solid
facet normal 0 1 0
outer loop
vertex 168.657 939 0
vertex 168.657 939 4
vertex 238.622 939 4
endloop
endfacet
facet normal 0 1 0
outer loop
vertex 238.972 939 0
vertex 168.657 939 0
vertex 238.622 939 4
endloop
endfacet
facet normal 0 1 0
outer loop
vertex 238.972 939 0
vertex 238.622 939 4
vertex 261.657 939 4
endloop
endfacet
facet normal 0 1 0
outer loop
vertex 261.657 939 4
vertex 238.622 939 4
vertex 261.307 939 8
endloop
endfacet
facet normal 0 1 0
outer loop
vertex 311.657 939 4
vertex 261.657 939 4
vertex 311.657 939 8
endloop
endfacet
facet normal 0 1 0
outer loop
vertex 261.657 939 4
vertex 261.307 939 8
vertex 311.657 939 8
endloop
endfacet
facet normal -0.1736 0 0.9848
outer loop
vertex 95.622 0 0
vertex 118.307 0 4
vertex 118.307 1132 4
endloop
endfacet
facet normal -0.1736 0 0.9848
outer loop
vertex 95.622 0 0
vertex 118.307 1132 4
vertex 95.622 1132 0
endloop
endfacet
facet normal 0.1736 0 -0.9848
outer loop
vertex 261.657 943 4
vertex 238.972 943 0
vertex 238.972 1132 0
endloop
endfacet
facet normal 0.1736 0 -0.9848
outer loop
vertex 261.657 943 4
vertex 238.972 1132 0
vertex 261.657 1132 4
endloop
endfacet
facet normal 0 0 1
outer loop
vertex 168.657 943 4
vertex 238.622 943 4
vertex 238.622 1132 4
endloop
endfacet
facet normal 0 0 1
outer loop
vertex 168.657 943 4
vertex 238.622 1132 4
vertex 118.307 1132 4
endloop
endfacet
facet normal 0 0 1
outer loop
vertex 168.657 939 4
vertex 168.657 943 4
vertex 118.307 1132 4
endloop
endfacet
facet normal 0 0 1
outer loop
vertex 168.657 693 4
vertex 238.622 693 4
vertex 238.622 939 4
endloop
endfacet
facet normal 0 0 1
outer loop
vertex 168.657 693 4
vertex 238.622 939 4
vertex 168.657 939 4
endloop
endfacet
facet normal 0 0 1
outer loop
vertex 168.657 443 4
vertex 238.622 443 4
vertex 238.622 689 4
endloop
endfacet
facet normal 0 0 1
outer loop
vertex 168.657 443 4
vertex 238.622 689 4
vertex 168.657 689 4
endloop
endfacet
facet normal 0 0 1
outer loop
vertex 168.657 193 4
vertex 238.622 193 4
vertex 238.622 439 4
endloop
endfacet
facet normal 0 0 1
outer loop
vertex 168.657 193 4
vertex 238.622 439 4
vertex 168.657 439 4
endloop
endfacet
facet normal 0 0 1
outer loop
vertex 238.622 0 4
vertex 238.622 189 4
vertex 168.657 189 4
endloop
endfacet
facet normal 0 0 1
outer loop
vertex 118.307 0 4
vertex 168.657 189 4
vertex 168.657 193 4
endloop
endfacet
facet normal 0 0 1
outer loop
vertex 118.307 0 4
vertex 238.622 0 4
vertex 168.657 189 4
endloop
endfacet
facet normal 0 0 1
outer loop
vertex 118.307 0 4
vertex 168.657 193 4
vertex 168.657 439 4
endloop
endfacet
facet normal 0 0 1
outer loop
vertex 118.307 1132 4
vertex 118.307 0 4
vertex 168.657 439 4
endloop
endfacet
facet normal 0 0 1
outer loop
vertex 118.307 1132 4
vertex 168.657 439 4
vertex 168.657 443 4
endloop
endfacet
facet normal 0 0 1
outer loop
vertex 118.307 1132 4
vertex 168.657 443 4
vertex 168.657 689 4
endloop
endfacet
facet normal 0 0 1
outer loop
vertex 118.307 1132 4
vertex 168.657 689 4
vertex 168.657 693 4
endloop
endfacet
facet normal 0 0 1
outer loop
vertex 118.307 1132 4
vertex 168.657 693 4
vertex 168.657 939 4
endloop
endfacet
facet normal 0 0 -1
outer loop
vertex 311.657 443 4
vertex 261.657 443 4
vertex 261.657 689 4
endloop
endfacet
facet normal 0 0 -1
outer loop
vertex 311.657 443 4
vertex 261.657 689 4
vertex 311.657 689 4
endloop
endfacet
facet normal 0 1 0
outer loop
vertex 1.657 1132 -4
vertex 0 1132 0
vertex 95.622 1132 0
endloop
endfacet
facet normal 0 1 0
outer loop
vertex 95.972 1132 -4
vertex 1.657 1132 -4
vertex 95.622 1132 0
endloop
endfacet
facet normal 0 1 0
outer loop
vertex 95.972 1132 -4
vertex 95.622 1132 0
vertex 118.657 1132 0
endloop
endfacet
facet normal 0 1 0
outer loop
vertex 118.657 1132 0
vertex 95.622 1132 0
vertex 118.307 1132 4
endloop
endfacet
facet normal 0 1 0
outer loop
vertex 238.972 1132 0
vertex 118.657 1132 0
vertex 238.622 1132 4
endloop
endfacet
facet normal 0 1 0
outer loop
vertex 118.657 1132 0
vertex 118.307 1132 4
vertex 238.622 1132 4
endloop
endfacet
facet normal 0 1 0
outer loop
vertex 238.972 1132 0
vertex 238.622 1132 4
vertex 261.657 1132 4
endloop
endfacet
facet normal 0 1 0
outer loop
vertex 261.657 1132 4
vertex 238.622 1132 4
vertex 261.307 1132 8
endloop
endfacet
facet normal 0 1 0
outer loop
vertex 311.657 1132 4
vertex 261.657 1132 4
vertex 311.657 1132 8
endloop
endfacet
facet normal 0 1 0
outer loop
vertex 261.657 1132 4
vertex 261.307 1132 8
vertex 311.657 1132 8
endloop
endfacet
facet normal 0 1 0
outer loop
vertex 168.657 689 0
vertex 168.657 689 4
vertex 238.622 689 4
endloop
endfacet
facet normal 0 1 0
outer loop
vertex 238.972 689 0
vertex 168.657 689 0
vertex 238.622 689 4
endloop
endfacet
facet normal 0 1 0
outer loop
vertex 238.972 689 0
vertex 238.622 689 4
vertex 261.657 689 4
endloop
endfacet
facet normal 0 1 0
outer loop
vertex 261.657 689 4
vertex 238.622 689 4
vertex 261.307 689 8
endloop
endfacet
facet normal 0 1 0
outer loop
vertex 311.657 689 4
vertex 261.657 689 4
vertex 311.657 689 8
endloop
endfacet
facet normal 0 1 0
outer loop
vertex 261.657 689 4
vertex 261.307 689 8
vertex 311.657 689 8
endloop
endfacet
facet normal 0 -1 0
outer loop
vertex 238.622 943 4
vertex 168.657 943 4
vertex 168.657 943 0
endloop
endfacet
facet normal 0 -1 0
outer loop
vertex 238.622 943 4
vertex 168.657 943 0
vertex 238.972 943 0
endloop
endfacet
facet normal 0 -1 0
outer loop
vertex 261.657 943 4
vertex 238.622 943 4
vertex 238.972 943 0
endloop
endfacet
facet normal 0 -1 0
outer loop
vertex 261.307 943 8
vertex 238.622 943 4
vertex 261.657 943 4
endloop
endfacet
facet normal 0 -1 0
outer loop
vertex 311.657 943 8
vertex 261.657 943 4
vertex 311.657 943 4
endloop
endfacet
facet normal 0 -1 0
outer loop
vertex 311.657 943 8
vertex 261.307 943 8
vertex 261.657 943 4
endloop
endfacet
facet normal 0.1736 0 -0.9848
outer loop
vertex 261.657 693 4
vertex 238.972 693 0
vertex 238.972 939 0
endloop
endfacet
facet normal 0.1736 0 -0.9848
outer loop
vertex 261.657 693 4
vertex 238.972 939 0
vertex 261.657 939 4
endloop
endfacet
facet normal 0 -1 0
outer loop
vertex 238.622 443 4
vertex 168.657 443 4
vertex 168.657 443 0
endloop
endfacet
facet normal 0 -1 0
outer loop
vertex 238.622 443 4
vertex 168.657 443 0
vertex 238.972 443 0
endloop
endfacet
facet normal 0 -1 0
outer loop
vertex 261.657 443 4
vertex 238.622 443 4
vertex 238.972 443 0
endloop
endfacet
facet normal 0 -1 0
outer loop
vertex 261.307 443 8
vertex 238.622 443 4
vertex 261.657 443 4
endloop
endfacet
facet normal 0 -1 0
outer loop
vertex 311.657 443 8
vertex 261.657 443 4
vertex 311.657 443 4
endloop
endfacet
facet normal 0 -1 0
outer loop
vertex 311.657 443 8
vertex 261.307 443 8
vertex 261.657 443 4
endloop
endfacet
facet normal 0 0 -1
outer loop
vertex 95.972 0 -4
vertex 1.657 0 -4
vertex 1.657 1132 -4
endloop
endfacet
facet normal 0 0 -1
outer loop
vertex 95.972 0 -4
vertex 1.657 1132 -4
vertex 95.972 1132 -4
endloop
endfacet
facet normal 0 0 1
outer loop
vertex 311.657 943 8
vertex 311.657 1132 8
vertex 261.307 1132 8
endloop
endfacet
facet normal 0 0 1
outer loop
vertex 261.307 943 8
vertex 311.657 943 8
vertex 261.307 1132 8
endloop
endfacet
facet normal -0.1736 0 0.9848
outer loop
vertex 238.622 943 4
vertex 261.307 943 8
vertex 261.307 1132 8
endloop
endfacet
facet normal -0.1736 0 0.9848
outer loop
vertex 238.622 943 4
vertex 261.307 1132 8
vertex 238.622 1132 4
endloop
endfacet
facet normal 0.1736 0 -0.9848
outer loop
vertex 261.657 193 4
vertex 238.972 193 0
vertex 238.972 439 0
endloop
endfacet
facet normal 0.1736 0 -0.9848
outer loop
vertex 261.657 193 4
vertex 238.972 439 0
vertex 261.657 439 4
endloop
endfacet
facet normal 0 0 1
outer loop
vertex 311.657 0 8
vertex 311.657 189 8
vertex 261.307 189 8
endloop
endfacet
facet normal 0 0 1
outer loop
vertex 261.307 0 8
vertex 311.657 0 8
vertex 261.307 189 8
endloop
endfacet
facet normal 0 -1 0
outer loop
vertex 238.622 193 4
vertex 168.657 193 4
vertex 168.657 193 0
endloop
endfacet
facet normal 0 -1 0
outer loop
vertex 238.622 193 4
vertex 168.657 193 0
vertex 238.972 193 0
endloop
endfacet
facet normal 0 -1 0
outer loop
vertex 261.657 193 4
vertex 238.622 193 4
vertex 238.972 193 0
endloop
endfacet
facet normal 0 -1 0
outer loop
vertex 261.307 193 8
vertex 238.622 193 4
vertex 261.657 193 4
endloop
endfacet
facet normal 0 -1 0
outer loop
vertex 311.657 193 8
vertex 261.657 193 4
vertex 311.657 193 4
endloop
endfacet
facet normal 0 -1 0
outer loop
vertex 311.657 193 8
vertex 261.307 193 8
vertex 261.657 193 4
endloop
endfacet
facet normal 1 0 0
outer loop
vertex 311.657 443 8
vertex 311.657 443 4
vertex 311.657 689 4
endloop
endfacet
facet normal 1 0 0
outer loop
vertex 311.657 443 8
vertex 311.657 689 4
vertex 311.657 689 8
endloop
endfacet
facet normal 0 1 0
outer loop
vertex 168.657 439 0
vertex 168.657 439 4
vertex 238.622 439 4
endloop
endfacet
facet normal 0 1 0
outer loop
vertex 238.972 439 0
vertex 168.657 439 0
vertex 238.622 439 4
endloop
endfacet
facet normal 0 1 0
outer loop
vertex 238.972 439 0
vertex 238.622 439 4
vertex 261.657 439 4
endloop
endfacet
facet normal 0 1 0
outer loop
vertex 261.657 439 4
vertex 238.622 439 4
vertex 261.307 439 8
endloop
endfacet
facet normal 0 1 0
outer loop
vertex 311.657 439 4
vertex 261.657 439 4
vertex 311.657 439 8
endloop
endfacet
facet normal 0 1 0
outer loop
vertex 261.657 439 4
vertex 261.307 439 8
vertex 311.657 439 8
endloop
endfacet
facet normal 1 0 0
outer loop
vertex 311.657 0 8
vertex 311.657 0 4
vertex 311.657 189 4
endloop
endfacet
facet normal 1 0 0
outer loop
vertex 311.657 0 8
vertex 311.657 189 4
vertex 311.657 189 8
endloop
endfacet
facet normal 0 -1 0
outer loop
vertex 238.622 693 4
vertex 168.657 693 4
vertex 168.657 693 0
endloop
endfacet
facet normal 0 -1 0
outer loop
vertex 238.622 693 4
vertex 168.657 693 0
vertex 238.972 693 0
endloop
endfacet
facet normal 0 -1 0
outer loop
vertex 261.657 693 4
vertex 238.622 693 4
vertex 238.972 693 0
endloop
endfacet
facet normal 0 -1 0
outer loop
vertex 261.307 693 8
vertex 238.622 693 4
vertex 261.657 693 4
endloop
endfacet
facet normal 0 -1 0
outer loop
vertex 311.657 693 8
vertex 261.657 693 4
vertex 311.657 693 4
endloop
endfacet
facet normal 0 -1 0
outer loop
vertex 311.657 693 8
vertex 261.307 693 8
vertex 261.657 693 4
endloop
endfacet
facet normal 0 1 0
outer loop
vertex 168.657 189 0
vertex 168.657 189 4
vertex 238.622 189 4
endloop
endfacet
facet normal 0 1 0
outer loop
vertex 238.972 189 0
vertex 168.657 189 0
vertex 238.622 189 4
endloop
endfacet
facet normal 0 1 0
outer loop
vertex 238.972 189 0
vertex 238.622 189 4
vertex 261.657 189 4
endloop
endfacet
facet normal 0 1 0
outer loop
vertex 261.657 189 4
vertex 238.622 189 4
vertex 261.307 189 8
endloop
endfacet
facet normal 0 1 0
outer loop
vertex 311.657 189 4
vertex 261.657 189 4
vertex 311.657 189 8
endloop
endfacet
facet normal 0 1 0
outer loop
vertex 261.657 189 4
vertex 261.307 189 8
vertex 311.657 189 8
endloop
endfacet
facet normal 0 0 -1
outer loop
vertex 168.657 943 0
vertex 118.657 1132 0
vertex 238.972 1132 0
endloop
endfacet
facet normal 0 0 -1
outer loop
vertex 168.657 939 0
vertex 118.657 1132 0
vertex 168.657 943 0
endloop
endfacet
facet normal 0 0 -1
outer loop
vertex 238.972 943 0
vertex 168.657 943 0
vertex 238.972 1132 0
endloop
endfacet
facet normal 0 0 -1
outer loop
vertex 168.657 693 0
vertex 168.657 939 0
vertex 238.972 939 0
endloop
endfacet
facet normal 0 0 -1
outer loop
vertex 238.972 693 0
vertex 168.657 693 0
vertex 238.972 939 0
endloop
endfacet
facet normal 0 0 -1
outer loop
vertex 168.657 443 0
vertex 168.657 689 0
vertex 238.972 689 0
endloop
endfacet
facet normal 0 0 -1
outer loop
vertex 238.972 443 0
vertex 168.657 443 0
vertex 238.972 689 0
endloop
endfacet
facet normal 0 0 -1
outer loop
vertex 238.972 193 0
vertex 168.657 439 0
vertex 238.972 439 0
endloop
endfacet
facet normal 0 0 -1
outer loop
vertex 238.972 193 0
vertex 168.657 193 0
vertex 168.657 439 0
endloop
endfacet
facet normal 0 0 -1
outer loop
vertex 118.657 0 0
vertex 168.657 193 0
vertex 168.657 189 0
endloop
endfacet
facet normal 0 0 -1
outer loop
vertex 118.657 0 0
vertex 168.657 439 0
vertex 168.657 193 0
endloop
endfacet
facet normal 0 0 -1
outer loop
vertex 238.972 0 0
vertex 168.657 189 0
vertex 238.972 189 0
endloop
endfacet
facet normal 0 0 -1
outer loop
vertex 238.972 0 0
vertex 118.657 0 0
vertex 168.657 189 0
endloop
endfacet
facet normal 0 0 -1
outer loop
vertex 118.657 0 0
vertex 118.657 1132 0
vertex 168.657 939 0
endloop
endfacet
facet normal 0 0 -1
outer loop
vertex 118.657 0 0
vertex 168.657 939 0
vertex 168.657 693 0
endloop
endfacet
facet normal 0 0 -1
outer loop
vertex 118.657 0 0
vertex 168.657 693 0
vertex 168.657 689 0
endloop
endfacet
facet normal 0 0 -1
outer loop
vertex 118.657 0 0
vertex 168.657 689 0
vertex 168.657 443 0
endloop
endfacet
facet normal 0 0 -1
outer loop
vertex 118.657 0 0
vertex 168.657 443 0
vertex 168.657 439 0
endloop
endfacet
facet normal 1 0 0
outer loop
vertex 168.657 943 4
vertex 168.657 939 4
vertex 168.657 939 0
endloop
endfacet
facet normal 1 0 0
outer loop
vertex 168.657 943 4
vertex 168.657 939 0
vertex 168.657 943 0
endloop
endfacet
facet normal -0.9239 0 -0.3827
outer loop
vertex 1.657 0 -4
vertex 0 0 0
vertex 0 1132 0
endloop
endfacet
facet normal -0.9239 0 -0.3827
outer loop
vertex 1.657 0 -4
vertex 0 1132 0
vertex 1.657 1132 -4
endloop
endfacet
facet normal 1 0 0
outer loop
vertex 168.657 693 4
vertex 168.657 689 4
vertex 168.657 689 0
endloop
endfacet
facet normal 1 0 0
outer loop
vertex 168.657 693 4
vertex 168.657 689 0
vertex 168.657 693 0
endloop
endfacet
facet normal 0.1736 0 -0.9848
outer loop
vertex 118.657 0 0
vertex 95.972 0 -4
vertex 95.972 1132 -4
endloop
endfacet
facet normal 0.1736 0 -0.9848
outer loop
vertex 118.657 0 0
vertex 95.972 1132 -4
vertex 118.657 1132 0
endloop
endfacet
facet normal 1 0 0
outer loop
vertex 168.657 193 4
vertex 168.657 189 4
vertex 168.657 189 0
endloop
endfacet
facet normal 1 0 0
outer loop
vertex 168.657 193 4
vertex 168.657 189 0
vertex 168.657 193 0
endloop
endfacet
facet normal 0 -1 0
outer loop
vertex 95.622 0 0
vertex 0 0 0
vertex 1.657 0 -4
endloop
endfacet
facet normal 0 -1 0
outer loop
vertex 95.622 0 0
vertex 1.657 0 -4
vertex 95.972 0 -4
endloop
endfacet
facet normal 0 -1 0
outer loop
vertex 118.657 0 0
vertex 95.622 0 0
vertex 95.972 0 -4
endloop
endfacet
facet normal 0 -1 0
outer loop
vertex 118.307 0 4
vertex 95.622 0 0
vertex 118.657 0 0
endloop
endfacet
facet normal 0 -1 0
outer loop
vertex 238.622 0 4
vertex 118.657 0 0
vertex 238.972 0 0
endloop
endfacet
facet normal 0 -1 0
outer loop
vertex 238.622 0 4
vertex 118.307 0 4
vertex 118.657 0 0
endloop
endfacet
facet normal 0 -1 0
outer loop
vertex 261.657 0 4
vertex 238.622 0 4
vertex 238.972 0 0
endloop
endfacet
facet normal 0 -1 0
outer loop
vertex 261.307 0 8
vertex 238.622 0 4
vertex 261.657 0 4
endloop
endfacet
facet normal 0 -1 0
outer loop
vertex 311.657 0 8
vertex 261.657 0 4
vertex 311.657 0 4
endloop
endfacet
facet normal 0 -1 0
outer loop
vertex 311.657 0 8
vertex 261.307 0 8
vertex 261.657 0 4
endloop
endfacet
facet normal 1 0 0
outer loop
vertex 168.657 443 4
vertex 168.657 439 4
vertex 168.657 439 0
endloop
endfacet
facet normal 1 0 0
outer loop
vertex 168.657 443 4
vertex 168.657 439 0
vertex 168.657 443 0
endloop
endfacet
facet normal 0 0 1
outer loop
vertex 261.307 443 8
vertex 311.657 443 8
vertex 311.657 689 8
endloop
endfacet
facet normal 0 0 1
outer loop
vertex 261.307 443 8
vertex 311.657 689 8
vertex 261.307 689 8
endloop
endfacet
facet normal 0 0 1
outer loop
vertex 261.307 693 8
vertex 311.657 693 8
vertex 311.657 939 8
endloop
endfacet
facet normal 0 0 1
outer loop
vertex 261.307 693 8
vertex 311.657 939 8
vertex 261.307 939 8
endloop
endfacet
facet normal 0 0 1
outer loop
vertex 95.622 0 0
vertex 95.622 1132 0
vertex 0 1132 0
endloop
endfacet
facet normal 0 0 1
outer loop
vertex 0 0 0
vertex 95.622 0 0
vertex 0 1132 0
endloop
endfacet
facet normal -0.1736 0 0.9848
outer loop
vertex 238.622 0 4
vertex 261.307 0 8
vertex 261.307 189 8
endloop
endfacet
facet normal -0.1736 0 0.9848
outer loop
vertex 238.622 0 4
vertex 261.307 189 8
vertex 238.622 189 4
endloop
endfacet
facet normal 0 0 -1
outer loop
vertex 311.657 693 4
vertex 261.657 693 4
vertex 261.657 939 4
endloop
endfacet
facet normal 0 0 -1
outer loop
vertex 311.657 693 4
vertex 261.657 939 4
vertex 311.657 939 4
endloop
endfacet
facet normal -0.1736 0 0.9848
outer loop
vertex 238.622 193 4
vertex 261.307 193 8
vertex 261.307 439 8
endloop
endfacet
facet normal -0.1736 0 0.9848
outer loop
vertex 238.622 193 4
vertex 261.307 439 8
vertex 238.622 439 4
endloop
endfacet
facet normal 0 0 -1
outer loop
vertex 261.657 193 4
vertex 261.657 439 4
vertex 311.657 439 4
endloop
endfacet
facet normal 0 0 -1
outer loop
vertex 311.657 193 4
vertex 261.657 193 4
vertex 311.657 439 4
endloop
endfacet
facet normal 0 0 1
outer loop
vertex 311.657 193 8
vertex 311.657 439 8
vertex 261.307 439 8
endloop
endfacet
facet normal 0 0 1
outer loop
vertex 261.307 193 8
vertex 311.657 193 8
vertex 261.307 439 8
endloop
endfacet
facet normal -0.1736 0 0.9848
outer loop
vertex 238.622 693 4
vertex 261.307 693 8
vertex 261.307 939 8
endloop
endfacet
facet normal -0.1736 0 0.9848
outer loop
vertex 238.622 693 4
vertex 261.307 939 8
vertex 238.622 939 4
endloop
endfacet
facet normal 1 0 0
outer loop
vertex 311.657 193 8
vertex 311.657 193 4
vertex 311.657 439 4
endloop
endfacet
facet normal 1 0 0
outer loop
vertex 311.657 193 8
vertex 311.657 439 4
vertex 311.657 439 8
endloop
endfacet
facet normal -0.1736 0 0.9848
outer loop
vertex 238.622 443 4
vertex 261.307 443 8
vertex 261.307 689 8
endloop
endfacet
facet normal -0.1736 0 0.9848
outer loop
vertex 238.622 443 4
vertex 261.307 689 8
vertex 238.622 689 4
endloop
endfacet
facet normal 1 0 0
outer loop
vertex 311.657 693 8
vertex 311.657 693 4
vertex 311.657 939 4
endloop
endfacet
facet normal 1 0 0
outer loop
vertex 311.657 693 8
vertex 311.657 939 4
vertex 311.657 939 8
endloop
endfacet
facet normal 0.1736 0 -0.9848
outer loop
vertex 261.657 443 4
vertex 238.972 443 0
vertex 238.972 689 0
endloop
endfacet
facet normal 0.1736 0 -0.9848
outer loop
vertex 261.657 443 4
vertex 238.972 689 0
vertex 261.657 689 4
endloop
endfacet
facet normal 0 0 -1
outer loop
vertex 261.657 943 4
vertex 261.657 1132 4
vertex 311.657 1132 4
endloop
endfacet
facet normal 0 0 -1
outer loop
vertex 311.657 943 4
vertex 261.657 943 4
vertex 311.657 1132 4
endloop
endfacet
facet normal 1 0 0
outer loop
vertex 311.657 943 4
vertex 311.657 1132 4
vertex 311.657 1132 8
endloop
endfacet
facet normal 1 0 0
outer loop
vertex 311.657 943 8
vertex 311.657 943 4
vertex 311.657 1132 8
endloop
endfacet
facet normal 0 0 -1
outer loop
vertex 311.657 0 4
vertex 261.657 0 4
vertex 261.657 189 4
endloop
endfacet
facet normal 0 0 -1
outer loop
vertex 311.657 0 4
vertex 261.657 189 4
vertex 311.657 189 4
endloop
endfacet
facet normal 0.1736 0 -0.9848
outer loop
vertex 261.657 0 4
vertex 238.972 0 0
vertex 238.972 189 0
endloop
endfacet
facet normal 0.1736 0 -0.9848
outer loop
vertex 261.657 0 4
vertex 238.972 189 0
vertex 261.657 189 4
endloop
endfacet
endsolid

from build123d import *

# Parameters (mm, degrees)
F1_DEPTH      = 1132
F2_W          = 143
F2_H          = 4
F3_DEPTH      = 8.001
F3_DEPTH_BACK = 4.001


with BuildPart() as f1:
    # F0 (on Front) → F1 (new body)
    with BuildSketch(Plane.XZ):
        Polygon((95.6217723169, 0), (0, 0), (1.6568542495, -4), (95.971726971, -4), (118.6568542495, 0), (238.971726971, 0), (261.6568542495, 4), (311.6568542495, 4), (311.6568542495, 8), (261.3068995954, 8), (238.6217723169, 4), (118.3068995954, 4), align=None)
    extrude(amount=-F1_DEPTH)

    # F2 (on face) → F3 (cut, two sides)
    with BuildSketch(Plane.XY.offset(4)) as f3_sk:
        with Locations((240.1568542495, 191)):
            Rectangle(F2_W, F2_H)
        with Locations((240.1568542495, 441)):
            Rectangle(F2_W, F2_H)
        with Locations((240.1568542495, 691)):
            Rectangle(F2_W, F2_H)
        with Locations((240.1568542495, 941)):
            Rectangle(F2_W, F2_H)
    extrude(amount=-F3_DEPTH, mode=Mode.SUBTRACT)
    extrude(f3_sk.sketch, amount=F3_DEPTH_BACK, mode=Mode.SUBTRACT)


solid = f1.part
